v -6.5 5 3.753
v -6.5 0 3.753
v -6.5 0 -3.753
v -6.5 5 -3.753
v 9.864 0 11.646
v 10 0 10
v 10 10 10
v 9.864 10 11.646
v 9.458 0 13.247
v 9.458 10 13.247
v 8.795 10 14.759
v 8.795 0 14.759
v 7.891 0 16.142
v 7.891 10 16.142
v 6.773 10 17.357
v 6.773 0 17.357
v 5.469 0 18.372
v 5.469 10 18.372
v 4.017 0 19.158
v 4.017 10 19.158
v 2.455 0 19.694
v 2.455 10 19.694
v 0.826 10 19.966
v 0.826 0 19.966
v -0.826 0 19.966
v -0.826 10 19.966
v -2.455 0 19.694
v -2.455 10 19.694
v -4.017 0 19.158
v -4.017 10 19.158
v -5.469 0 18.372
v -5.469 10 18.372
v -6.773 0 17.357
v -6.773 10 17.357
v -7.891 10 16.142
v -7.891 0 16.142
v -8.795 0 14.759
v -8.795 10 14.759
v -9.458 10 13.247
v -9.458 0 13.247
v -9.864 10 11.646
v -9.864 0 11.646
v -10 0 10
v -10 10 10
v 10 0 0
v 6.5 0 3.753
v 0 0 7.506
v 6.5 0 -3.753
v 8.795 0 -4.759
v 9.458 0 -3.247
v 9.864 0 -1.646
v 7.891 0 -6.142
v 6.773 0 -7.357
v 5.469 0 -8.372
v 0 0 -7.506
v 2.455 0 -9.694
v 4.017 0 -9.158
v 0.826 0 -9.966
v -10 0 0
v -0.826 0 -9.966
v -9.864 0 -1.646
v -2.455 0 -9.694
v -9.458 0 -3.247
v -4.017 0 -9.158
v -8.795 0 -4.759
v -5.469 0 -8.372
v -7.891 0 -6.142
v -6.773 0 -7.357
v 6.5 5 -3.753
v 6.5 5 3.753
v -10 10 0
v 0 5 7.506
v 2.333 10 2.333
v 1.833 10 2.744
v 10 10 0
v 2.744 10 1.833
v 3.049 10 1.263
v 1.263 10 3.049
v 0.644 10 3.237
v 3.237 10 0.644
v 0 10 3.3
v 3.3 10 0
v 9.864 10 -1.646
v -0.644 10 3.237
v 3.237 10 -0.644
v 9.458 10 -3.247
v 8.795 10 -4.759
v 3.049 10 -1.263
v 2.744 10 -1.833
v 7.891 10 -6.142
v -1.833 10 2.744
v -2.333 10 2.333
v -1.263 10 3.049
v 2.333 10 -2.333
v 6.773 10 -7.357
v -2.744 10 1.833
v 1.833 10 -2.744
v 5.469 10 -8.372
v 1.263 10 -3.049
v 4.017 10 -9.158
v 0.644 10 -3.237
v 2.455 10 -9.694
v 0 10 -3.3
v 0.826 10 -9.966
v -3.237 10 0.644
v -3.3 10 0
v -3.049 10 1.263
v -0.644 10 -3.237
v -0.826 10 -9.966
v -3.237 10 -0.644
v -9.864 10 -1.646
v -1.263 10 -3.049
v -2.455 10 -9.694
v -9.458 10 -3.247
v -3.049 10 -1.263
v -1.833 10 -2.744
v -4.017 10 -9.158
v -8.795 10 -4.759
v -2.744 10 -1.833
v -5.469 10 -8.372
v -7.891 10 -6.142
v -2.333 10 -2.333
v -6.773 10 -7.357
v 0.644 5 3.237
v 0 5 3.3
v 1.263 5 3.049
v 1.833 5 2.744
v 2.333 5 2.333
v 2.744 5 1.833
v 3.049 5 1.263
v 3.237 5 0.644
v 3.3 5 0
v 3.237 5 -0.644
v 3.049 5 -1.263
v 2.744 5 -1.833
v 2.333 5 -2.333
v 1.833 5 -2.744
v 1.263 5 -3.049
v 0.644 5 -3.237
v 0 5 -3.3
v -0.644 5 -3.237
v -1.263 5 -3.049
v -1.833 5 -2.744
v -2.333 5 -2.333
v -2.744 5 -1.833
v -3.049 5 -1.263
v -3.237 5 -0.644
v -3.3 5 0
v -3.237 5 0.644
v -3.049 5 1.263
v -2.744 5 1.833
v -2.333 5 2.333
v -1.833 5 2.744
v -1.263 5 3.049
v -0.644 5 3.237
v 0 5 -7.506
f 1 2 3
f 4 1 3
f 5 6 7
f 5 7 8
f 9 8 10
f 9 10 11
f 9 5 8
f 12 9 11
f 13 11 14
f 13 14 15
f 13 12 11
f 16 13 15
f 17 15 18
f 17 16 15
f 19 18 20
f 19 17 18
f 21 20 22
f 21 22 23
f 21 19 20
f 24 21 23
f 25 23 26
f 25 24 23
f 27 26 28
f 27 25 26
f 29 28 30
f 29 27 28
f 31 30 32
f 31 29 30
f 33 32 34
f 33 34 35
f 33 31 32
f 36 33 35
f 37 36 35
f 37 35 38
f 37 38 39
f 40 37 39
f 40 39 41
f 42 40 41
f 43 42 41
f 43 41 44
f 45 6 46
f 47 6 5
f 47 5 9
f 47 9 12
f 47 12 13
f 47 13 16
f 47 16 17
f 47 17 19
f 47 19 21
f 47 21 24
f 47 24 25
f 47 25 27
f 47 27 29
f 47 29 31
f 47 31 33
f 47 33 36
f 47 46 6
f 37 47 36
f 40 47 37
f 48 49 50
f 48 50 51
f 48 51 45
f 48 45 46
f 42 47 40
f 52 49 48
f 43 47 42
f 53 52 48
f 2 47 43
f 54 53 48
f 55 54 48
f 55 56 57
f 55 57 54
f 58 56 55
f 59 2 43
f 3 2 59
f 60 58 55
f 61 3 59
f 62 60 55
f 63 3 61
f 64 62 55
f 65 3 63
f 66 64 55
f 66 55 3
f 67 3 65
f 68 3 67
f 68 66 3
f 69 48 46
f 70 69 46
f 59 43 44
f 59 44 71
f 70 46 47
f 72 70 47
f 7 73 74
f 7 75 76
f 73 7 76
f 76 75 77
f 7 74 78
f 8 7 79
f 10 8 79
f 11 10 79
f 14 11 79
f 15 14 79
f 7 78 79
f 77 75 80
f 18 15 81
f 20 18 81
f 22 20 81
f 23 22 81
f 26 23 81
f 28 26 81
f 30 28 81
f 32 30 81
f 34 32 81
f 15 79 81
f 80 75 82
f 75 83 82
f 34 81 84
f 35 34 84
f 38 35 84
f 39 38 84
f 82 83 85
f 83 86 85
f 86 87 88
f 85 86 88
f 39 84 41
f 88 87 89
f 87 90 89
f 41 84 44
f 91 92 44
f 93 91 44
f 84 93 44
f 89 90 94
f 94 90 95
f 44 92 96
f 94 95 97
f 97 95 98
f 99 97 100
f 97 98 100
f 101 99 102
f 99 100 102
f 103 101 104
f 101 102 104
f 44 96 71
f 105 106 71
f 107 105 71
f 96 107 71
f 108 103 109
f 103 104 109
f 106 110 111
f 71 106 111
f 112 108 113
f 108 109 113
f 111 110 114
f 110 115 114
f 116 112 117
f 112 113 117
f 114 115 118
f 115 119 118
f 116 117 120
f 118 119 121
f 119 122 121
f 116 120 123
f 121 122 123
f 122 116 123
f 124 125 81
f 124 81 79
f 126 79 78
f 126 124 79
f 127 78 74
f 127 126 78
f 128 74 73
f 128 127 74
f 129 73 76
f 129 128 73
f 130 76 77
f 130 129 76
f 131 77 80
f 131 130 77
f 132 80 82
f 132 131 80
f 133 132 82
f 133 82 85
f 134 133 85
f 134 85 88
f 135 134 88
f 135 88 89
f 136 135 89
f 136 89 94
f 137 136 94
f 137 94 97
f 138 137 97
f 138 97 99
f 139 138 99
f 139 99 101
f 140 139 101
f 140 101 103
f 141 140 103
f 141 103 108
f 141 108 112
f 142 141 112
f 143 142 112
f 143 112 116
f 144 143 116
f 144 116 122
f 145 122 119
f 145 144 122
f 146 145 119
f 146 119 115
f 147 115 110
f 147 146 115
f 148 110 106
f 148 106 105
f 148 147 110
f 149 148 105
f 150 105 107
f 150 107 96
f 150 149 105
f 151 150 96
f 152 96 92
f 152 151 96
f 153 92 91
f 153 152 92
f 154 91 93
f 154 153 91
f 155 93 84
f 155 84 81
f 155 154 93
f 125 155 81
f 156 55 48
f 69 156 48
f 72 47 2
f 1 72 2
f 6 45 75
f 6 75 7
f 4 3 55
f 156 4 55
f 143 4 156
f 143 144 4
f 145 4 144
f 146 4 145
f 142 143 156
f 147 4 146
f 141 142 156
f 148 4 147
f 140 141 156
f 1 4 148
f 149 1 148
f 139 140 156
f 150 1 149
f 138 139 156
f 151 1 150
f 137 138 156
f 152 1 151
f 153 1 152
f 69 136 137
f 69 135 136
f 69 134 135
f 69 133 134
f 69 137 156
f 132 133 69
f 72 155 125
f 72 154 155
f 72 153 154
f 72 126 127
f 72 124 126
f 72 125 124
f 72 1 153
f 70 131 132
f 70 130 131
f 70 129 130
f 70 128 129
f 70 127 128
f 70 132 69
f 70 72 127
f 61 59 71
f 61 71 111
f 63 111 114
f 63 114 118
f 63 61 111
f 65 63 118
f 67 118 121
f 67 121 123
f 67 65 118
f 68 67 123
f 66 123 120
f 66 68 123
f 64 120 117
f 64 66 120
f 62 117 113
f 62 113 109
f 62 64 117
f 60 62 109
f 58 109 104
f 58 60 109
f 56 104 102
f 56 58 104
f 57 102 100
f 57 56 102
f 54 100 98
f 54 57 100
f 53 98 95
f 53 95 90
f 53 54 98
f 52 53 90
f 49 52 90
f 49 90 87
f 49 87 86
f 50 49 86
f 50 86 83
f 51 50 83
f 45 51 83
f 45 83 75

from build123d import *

# Parameters (mm, degrees)
SKETCH1_R           = 3.3
BOSS_EXTRUDE1_DEPTH = 10
CUT_EXTRUDE1_DEPTH  = 5


with BuildPart() as part:
    # Sketch1 → Boss-Extrude1 (new body)
    with BuildSketch(Plane(origin=(0, 0, 0), x_dir=(1, 0, 0), z_dir=(0, 1, 0))):
        with BuildLine():
            Line((10, 0), (10, -10))
            ThreePointArc((10, -10), (0, -20), (-10, -10))
            Line((-10, -10), (-10, 0))
            ThreePointArc((-10, 0), (0, 10), (10, 0))
        make_face()
        with Locations(Location((0, 0, 0), (0, 0, 270))):
            Circle(SKETCH1_R, mode=Mode.SUBTRACT)
    extrude(amount=BOSS_EXTRUDE1_DEPTH)

    # Sketch2 → Cut-Extrude1 (cut)
    with BuildSketch(Plane.XZ):
        Polygon((6.5, 3.75277675), (0, 7.505553499), (-6.5, 3.75277675), (-6.5, -3.75277675), (0, -7.505553499), (6.5, -3.75277675), align=None)
    extrude(amount=-CUT_EXTRUDE1_DEPTH, mode=Mode.SUBTRACT)


solid = part.part
